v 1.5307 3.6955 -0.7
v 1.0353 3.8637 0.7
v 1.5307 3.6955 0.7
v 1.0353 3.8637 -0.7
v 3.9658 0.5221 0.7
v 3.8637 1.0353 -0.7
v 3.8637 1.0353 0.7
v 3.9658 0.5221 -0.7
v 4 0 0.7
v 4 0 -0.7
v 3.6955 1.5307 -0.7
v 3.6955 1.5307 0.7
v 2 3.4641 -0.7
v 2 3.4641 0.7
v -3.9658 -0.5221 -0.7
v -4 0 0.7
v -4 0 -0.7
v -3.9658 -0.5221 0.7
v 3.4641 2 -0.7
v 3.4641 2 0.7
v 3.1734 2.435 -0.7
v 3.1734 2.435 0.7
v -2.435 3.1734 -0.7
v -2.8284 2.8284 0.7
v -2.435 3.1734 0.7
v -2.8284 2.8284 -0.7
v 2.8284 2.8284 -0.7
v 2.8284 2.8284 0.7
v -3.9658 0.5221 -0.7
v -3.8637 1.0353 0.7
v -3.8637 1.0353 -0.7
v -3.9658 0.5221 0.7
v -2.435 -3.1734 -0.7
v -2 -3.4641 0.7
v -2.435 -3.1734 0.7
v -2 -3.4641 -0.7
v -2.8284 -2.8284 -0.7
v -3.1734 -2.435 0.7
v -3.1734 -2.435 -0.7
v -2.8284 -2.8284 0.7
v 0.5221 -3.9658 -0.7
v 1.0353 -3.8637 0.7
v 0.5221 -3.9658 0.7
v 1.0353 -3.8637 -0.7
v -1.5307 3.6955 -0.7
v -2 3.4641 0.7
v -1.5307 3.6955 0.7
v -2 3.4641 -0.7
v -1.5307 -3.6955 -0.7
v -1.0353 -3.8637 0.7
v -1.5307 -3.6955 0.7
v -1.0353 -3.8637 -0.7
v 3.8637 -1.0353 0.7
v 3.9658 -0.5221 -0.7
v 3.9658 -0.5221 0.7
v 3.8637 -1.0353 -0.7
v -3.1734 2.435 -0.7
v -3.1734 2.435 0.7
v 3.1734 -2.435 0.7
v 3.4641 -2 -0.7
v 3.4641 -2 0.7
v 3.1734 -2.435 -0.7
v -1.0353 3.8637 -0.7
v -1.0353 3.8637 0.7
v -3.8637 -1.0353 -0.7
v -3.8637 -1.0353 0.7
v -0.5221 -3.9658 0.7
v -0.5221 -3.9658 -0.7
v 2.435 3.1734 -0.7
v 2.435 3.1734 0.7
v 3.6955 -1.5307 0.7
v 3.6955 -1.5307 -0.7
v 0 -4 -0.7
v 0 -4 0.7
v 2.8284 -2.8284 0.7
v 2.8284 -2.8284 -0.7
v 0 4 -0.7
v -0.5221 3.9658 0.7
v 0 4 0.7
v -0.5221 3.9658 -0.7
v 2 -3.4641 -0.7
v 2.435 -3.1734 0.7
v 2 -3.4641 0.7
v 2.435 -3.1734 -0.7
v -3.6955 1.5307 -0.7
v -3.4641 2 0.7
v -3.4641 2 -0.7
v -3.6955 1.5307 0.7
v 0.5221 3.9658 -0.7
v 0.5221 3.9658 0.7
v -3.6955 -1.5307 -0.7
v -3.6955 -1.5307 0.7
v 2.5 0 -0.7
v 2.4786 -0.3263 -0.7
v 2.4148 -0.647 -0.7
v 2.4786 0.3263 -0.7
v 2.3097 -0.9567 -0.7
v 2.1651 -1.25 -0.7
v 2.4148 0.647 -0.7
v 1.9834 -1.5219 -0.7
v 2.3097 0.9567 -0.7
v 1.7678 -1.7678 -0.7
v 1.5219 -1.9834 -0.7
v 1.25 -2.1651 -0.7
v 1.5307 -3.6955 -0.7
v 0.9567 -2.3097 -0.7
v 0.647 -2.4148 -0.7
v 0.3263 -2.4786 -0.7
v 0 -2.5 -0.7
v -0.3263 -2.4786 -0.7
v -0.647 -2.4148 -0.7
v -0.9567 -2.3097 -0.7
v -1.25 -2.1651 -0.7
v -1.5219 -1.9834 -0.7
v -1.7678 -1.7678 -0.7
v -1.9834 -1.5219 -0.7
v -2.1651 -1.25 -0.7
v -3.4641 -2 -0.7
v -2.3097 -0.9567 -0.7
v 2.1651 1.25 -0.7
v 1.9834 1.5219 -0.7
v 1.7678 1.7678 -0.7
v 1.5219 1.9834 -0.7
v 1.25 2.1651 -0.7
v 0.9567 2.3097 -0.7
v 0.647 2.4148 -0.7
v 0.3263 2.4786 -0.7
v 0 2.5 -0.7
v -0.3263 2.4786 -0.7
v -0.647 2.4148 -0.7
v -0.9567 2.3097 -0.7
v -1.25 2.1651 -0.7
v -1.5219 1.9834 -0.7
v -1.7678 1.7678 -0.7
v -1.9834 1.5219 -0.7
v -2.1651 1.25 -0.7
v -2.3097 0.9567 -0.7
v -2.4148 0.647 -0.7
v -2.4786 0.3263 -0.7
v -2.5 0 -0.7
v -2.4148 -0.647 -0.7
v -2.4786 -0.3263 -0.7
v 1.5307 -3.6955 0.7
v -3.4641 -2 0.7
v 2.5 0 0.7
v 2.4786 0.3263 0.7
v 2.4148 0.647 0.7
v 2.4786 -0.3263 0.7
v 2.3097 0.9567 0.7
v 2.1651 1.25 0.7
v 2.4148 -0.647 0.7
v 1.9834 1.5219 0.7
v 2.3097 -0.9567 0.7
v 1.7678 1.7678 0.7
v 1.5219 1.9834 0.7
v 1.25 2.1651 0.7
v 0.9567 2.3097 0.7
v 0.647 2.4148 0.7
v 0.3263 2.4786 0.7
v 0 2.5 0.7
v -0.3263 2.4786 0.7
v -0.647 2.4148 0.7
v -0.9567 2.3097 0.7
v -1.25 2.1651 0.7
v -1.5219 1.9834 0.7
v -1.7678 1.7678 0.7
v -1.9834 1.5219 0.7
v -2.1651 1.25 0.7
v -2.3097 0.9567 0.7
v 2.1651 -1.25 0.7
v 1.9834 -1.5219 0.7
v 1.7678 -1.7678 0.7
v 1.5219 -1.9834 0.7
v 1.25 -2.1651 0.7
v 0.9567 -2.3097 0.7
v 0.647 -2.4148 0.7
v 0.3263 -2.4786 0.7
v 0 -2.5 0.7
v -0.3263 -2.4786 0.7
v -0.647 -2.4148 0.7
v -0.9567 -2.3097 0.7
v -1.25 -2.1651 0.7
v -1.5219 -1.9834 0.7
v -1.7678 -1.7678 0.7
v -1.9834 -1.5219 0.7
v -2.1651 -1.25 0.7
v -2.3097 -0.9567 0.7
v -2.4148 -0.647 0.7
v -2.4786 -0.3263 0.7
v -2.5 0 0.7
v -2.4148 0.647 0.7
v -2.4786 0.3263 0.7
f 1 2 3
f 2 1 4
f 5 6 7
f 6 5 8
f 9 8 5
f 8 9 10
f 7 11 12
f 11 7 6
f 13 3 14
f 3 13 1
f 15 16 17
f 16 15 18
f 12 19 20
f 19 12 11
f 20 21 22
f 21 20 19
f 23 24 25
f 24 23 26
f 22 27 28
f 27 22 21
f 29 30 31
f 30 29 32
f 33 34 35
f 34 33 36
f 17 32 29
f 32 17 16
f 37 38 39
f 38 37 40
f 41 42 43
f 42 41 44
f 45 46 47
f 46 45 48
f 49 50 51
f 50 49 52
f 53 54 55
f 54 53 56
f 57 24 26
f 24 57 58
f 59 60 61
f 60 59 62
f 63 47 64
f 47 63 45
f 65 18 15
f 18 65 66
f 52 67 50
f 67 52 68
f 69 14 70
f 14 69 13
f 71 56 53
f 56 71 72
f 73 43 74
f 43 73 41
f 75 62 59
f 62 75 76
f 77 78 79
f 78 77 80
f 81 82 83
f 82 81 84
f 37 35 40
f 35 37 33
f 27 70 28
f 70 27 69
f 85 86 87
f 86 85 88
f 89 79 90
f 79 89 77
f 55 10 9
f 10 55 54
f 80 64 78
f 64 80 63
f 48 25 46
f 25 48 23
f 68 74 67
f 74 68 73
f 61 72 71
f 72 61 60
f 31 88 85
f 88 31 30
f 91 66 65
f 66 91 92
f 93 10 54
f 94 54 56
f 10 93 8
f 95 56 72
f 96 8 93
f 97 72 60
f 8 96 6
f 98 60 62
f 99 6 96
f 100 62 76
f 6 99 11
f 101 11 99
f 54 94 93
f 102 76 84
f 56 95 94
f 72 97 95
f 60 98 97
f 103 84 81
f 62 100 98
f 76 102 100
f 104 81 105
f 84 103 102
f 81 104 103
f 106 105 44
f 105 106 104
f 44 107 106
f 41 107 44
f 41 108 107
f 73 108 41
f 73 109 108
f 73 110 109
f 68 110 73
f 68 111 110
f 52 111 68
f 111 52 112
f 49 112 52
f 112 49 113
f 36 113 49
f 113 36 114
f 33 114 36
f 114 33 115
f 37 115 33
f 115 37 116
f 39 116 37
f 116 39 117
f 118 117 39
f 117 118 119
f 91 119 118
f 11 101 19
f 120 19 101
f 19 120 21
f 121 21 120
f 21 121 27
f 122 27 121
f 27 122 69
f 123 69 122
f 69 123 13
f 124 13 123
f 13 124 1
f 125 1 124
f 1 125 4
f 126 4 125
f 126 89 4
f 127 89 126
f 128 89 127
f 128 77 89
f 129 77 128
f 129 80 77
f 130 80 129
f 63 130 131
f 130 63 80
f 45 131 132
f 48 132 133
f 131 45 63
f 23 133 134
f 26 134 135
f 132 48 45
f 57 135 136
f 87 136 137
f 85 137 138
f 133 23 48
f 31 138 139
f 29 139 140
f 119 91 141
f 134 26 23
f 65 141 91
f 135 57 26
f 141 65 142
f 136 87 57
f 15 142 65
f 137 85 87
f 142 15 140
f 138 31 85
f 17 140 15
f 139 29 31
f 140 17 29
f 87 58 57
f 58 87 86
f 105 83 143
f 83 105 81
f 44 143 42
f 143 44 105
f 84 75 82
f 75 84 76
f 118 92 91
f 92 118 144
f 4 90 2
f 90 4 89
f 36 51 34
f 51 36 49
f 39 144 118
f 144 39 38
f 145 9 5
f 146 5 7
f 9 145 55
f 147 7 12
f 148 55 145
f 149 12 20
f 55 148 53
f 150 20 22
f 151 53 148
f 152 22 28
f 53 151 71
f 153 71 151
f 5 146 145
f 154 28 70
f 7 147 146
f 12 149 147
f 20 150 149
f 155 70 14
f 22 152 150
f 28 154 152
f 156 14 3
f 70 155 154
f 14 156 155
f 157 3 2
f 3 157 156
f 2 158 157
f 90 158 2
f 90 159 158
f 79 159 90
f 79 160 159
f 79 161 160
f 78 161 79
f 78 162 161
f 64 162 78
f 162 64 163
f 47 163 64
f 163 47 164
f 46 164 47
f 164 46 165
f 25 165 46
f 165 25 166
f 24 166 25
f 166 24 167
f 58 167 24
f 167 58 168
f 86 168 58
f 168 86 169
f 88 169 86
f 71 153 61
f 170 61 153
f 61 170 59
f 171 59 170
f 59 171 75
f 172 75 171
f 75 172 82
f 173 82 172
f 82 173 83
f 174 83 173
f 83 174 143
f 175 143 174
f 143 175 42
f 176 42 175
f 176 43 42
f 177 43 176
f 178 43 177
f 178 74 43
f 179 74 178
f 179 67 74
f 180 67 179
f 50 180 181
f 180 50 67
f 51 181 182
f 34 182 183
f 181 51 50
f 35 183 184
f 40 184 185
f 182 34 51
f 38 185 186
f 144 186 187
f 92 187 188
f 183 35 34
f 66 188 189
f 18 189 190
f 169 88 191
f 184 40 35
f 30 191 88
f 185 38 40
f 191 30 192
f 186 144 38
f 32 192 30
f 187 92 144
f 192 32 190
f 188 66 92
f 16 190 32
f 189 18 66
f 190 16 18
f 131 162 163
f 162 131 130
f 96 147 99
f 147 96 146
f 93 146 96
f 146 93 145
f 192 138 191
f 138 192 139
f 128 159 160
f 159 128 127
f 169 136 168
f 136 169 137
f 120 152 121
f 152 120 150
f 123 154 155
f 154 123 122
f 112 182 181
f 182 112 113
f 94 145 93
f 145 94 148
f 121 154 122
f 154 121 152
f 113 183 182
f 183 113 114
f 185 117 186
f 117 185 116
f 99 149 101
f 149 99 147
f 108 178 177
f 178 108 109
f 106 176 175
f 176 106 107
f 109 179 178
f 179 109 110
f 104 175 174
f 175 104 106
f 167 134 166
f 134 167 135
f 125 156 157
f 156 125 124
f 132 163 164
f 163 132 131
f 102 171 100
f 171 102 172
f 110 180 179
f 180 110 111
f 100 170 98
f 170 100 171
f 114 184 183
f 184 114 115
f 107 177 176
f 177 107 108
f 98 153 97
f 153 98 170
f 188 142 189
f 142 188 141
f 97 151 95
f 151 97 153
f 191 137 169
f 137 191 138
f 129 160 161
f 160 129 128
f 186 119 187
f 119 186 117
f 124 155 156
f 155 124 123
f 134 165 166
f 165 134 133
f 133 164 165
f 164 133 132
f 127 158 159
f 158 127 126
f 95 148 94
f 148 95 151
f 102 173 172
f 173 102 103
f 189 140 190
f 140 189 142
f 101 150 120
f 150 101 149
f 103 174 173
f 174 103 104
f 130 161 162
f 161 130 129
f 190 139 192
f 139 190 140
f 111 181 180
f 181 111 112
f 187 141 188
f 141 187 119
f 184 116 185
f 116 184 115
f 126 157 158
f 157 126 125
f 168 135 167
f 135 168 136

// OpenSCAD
difference()
{
	cylinder(d=8,h=1.4,center=true,$fn=24*2);
	cylinder(d=5,h=1.4+0.2,center=true,$fn=24*2);
}
